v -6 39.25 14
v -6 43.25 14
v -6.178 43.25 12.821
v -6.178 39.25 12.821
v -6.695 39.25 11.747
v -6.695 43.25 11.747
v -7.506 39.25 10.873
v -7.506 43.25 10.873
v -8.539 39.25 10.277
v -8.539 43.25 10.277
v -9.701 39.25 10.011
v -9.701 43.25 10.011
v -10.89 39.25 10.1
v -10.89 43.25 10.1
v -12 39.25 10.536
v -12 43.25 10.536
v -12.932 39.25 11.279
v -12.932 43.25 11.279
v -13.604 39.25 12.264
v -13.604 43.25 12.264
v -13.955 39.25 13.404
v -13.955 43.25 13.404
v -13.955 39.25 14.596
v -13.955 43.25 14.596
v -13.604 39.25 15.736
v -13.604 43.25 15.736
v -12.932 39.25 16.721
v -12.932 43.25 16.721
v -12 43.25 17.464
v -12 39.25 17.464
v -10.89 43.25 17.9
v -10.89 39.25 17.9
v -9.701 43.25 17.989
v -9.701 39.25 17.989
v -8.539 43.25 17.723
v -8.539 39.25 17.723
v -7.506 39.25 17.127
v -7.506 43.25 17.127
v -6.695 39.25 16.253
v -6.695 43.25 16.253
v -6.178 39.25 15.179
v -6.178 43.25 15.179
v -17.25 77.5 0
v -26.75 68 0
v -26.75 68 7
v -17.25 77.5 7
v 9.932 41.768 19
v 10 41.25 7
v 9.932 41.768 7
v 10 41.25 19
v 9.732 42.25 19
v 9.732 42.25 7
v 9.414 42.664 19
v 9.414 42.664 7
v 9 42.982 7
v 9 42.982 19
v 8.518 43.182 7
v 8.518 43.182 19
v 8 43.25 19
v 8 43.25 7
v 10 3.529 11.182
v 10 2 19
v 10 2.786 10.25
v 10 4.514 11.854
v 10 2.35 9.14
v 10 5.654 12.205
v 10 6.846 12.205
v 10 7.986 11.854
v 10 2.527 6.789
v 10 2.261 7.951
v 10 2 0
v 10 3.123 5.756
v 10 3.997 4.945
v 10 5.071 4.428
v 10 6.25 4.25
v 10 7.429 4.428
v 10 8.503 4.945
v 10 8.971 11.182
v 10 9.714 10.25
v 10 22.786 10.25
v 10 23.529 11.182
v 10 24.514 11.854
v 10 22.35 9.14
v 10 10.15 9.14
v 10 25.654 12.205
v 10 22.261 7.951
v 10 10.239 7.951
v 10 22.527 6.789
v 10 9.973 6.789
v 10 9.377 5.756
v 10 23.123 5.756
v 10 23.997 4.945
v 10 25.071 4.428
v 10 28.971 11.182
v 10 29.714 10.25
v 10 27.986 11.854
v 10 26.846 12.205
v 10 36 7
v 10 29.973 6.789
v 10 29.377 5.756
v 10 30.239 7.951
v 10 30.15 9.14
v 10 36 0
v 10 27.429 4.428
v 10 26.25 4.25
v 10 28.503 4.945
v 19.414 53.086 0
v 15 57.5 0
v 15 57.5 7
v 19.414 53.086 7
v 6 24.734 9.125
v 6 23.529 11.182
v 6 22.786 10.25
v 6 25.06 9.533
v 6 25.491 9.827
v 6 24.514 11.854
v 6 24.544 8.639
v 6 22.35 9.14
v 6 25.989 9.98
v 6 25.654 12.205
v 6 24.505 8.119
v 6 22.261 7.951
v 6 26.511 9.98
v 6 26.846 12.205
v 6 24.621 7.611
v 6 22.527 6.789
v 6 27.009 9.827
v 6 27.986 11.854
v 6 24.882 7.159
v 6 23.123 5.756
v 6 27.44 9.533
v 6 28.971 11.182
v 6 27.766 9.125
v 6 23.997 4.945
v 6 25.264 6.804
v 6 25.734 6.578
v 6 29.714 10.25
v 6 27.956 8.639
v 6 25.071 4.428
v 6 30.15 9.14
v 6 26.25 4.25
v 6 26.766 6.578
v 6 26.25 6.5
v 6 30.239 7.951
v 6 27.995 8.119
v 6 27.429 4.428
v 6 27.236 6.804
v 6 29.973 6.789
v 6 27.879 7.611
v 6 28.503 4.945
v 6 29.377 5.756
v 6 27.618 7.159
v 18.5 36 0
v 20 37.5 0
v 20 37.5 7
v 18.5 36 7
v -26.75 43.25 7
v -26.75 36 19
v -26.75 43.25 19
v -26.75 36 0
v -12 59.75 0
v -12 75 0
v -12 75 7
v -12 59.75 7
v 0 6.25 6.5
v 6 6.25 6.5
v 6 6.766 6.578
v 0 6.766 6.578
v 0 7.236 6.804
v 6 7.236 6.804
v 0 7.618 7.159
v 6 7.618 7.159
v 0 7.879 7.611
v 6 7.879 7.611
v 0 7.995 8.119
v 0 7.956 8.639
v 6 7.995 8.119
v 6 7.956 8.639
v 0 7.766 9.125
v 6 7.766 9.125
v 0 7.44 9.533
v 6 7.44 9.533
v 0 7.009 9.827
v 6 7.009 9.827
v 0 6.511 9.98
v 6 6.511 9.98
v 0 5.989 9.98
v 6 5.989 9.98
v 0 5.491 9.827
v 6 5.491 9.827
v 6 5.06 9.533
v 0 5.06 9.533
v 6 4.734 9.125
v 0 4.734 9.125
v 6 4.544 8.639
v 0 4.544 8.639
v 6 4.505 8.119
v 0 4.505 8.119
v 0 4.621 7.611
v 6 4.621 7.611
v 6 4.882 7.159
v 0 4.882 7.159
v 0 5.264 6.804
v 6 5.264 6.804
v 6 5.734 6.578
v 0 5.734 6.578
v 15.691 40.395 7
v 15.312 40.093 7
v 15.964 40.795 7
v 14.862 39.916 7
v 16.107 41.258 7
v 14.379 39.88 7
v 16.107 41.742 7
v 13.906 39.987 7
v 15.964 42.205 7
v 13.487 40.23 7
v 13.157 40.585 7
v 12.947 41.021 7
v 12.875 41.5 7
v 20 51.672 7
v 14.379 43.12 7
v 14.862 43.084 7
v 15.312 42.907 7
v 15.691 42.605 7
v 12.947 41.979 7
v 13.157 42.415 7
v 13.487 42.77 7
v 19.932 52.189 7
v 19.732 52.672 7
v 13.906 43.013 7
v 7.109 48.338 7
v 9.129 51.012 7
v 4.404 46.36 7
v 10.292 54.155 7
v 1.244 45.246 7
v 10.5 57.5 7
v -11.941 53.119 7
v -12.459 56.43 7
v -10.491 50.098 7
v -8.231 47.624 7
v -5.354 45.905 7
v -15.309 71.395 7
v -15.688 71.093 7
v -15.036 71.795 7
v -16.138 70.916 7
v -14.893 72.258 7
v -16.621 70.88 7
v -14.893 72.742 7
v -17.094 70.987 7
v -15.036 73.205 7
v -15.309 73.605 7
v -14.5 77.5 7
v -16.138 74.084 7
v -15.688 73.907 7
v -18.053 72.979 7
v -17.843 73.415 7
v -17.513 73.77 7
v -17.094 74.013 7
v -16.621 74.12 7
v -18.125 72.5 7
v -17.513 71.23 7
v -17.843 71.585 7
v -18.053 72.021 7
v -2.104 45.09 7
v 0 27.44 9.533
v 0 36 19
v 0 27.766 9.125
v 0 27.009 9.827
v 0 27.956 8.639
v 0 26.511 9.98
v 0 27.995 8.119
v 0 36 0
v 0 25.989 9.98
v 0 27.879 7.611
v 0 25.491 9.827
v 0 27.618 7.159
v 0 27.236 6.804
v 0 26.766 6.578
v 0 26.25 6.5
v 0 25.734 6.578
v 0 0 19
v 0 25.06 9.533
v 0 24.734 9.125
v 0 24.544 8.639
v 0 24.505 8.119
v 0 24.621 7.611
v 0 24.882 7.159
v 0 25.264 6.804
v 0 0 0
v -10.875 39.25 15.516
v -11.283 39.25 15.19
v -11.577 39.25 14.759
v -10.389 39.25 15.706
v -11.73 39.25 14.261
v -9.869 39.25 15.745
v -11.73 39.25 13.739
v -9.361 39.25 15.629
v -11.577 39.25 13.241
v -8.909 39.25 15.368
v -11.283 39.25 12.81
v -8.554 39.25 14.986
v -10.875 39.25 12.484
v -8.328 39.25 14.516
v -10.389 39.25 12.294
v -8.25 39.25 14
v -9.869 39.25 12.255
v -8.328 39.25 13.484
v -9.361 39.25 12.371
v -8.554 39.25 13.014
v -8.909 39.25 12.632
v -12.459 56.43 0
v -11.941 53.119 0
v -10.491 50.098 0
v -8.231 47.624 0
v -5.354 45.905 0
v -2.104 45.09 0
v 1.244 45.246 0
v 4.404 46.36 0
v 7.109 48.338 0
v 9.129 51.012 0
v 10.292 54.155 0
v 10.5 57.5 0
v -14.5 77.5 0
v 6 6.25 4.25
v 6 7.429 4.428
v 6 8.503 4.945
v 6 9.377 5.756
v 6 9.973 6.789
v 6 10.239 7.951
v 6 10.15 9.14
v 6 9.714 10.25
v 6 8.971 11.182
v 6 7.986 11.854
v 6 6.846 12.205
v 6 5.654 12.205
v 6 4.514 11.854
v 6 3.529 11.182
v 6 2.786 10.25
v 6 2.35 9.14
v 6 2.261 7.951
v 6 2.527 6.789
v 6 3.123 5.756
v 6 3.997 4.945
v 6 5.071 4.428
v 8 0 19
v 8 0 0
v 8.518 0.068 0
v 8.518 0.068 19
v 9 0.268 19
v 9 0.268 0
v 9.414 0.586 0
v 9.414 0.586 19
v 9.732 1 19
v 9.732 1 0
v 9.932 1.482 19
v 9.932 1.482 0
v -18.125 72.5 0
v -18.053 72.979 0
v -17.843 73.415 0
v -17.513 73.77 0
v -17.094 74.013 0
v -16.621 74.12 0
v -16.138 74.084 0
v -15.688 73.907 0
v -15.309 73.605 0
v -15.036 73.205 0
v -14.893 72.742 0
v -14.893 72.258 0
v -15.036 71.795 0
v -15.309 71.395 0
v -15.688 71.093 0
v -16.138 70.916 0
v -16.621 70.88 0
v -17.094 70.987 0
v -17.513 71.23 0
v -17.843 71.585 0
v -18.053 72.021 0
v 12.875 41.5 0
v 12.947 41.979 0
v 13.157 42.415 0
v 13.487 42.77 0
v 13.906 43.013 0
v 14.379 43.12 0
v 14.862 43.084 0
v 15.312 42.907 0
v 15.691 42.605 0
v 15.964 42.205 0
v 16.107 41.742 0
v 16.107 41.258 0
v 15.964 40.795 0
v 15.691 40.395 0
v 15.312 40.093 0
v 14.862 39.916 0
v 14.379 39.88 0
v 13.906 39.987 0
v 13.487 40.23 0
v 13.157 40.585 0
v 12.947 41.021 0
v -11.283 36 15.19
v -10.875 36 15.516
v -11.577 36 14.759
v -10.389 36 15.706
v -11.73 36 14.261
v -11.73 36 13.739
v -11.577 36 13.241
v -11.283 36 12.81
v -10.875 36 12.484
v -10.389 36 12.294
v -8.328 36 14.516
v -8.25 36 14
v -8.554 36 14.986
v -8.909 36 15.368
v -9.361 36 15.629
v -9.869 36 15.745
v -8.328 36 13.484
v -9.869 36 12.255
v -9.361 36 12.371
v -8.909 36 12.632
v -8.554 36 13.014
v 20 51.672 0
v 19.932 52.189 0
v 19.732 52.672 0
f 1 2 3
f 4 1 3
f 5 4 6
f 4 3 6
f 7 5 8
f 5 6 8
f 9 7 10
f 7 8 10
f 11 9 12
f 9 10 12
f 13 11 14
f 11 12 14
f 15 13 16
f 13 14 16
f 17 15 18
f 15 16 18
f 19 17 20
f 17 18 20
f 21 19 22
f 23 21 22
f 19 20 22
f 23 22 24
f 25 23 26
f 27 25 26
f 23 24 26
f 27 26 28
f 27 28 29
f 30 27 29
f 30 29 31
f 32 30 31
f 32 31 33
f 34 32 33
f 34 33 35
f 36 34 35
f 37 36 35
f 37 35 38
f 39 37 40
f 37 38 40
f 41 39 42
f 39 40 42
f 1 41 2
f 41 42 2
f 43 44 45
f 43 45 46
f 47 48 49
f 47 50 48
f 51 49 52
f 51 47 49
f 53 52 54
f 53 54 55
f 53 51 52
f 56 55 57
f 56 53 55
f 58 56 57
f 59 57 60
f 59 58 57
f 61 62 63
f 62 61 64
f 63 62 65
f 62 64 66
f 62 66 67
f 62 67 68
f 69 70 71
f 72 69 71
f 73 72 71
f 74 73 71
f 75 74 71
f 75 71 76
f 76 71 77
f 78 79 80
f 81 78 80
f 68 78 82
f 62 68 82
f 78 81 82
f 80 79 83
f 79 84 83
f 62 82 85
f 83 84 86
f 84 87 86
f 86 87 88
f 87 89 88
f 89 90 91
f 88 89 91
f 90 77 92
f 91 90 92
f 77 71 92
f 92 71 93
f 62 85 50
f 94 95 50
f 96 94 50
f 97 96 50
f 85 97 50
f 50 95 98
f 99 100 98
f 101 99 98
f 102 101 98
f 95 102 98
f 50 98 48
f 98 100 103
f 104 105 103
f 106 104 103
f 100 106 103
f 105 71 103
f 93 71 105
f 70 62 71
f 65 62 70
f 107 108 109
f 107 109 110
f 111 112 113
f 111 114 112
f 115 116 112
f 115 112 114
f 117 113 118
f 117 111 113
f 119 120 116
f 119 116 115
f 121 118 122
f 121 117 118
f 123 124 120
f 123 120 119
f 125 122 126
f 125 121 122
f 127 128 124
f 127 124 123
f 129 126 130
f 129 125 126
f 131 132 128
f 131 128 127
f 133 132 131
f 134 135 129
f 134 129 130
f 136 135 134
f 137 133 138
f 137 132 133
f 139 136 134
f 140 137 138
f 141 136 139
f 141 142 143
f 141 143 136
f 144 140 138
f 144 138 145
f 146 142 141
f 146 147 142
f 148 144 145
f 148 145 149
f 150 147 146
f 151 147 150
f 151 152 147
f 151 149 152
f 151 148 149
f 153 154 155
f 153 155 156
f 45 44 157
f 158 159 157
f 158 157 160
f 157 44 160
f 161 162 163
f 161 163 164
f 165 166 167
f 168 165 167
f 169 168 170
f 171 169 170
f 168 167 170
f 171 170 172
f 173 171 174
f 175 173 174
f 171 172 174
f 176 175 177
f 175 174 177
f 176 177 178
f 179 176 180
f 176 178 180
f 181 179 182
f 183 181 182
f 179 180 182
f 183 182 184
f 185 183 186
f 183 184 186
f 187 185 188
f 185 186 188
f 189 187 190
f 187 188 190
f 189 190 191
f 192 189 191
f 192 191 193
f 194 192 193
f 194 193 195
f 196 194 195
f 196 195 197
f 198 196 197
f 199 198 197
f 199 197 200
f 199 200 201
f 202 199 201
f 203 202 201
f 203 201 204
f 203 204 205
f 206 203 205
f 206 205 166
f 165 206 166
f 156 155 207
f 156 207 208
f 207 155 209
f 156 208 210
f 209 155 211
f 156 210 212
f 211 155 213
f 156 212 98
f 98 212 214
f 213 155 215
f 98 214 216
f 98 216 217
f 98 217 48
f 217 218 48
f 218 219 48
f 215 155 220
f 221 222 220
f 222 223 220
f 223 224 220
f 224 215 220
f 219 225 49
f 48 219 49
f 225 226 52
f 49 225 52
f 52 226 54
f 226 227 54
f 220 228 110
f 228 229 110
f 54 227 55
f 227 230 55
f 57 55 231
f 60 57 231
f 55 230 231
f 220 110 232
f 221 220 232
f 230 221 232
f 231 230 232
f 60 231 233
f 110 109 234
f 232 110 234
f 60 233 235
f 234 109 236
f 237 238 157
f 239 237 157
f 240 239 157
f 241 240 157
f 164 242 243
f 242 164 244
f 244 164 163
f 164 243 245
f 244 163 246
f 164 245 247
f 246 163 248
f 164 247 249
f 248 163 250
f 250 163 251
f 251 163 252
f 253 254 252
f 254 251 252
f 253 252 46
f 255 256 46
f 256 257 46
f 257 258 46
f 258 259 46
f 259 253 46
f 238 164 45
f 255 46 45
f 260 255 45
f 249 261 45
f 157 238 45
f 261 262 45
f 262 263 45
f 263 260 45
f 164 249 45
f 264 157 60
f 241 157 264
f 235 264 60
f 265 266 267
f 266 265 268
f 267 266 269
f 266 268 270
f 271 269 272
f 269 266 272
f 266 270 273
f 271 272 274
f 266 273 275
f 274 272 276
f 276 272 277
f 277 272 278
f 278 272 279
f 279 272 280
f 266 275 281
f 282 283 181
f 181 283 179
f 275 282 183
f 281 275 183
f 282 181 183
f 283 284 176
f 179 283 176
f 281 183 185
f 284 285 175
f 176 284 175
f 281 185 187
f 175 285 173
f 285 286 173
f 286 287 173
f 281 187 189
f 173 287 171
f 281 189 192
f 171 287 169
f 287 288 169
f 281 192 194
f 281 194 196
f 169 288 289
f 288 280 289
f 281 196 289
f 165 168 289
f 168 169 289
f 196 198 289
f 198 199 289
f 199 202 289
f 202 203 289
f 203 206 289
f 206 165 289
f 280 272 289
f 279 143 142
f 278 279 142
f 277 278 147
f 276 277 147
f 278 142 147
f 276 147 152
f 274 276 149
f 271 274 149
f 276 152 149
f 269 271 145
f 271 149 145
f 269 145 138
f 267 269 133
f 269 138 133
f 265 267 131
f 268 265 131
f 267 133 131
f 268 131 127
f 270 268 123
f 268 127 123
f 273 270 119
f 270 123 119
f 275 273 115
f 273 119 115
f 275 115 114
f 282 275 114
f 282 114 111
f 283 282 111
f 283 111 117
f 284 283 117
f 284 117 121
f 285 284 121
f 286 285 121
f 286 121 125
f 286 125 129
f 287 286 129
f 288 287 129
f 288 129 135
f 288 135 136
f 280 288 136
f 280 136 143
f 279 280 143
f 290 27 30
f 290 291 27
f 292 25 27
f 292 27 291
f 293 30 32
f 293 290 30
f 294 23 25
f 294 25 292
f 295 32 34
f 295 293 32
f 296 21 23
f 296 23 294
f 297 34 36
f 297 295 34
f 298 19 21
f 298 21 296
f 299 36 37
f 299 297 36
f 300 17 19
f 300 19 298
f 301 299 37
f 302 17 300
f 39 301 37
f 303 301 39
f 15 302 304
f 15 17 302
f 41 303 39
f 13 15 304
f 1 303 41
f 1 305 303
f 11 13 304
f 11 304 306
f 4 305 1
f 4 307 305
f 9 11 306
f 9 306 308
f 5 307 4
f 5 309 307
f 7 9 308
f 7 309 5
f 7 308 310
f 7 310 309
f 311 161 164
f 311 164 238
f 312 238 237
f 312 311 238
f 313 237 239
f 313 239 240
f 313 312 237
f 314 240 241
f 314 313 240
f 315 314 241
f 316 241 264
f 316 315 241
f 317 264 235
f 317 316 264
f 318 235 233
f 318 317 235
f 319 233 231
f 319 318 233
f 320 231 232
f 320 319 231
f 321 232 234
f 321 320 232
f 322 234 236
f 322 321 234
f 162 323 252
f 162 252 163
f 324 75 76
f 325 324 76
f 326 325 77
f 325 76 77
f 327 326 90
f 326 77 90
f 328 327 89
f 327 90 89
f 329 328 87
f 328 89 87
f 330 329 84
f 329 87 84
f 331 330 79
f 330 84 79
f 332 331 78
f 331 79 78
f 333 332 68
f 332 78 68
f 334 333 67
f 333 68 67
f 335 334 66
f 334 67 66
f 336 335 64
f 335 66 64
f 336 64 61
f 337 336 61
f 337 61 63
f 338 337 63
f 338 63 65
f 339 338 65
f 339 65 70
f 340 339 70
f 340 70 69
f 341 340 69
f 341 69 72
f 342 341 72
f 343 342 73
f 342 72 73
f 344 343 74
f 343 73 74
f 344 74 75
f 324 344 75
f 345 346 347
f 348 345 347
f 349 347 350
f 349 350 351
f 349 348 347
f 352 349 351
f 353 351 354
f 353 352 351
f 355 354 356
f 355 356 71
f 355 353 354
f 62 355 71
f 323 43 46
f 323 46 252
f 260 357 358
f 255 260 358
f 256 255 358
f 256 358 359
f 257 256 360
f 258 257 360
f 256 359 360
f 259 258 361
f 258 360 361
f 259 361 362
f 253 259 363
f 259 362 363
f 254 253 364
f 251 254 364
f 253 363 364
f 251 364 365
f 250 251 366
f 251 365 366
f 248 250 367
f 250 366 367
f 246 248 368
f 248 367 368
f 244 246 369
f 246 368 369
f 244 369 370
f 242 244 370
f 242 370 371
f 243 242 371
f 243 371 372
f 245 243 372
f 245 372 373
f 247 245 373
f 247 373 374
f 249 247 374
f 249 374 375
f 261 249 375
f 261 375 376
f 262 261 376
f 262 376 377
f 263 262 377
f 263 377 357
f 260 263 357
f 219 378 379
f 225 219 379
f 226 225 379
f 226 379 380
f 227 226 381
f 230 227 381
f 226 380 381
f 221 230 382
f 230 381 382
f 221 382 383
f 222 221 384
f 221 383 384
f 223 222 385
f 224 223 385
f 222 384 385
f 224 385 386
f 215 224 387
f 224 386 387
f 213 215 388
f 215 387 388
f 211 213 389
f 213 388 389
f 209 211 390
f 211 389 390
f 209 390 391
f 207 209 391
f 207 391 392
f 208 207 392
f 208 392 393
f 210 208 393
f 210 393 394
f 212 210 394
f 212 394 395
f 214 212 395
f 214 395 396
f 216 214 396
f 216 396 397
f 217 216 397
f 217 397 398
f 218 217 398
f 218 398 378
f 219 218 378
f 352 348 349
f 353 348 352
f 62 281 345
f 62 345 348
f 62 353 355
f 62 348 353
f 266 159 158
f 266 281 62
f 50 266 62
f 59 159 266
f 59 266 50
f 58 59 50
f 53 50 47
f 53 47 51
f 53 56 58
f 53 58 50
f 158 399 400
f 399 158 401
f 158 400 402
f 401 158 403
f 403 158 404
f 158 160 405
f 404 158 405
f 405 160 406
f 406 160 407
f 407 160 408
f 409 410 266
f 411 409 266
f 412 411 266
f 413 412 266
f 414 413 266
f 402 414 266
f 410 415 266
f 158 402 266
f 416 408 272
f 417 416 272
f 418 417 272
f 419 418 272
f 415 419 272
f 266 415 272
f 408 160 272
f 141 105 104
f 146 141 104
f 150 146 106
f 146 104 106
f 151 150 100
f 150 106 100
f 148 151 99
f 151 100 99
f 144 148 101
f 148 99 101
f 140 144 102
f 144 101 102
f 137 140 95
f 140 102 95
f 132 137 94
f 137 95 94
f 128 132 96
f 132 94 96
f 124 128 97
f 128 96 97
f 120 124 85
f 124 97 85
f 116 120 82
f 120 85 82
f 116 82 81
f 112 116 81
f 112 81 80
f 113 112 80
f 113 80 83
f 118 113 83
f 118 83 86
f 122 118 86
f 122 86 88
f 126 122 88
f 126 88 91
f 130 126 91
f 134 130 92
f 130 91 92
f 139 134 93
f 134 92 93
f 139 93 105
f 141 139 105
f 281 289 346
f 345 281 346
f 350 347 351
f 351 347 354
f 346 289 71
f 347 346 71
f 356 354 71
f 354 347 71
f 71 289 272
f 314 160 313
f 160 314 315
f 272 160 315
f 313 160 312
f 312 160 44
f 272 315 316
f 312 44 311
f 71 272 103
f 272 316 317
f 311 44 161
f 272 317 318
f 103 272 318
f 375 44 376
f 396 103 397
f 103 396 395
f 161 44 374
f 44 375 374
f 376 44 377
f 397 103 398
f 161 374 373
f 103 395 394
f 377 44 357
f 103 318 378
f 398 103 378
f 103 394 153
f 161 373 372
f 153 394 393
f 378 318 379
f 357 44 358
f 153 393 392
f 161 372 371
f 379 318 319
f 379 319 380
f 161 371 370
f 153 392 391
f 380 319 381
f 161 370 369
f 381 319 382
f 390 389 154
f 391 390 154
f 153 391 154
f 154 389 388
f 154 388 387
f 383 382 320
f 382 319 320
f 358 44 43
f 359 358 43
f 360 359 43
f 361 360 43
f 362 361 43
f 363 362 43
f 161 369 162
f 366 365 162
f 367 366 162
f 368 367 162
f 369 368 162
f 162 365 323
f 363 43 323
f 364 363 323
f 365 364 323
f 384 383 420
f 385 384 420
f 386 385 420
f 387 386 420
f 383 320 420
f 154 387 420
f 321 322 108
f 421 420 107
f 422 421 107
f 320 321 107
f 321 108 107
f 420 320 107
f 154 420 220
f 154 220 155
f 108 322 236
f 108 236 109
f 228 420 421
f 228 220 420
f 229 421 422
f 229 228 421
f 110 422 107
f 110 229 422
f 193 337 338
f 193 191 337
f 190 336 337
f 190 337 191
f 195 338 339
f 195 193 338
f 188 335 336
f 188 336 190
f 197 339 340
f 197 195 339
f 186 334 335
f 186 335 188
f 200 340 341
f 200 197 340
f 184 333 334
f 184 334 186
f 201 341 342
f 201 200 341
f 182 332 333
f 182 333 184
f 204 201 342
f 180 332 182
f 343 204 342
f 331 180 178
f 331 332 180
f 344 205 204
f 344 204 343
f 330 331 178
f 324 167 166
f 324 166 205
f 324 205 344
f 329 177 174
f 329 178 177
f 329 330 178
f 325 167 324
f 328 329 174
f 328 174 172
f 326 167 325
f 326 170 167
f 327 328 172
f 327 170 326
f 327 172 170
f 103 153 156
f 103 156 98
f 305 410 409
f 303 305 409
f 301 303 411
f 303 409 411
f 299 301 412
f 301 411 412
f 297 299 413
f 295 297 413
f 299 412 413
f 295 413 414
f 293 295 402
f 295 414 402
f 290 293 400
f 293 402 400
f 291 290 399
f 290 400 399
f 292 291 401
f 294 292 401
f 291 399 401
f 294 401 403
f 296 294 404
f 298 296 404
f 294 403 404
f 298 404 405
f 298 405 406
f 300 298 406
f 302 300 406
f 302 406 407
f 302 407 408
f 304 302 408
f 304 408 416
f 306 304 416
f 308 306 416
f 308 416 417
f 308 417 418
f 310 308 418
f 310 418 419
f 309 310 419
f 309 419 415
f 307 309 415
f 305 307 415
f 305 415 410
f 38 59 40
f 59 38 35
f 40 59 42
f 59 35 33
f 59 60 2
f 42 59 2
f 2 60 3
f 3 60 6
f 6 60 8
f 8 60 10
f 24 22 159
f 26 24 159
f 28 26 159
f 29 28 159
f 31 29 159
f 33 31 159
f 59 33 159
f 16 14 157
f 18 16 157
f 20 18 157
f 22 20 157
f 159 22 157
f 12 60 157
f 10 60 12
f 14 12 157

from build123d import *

# Parameters (mm, degrees)
BOSS_EXTRUDE1_DEPTH = 19
BOSS_EXTRUDE2_DEPTH = 7
SKETCH3_R           = 1.75
CUT_EXTRUDE1_DEPTH  = 37.75
SKETCH6_R           = 4
CUT_EXTRUDE4_DEPTH  = 4
SKETCH7_R           = 1.625
CUT_EXTRUDE5_DEPTH  = 20
FILLET1_R           = 2
SKETCH8_R           = 1.75
CUT_EXTRUDE6_DEPTH  = 10
SKETCH9_R           = 4
CUT_EXTRUDE7_DEPTH  = 4


with BuildPart() as part:
    # Sketch1 → Boss-Extrude1 (new body)
    with BuildSketch(Plane.XY):
        Polygon((0, 0), (10, 0), (10, 43.25), (-26.75, 43.25), (-26.75, 36), (0, 36), align=None)
    extrude(amount=BOSS_EXTRUDE1_DEPTH)

    # Sketch2 → Boss-Extrude2 (add)
    with BuildSketch(Plane(origin=(0, 0, 0), x_dir=(-1, 0, 0), z_dir=(0, 0, -1))):
        with BuildLine():
            Line((-10, 36), (26.75, 36))
            Line((26.75, 36), (26.75, 68))
            Line((26.75, 68), (17.25, 77.5))
            Line((17.25, 77.5), (14.5, 77.5))
            Line((14.5, 77.5), (12, 75))
            Line((12, 75), (12, 59.75))
            ThreePointArc((12, 59.75), (2.103531724, 45.089682755), (-10.5, 57.5))
            Line((-10.5, 57.5), (-15, 57.5))
            Line((-15, 57.5), (-20, 52.5))
            Line((-20, 52.5), (-20, 37.5))
            Line((-20, 37.5), (-18.5, 36))
            Line((-18.5, 36), (-10, 36))
        make_face()
    extrude(amount=-BOSS_EXTRUDE2_DEPTH)

    # Sketch3 → Cut-Extrude1 (cut, through all)
    with BuildSketch(Plane(origin=(10, 0, 0), x_dir=(0, 0, -1), z_dir=(1, 0, 0))):
        with Locations((-8.25, 26.25)):
            Circle(SKETCH3_R)
        with Locations((-8.25, 6.25)):
            Circle(SKETCH3_R)
    extrude(amount=-CUT_EXTRUDE1_DEPTH, mode=Mode.SUBTRACT)

    # Sketch6 → Cut-Extrude4 (cut)
    with BuildSketch(Plane(origin=(10, 0, 0), x_dir=(0, 0, -1), z_dir=(1, 0, 0))):
        with Locations((-8.25, 26.25)):
            Circle(SKETCH6_R)
        with Locations((-8.25, 6.25)):
            Circle(SKETCH6_R)
    extrude(amount=-CUT_EXTRUDE4_DEPTH, mode=Mode.SUBTRACT)

    # Sketch7 → Cut-Extrude5 (cut, through all)
    with BuildSketch(Plane(origin=(0, 0, 0), x_dir=(-1, 0, 0), z_dir=(0, 0, -1))):
        with Locations((16.5, 72.5)):
            Circle(SKETCH7_R)
        with Locations((-14.5, 41.5)):
            Circle(SKETCH7_R)
    extrude(amount=-CUT_EXTRUDE5_DEPTH, mode=Mode.SUBTRACT)

    # Fillet1
    fillet1_edges = [part.edges().sort_by_distance(p)[0] for p in [
        (10, 43.25, 13),
        (10, 0, 9.5),
        (20, 52.5, 3.5),
    ]]
    fillet(fillet1_edges, radius=FILLET1_R)

    # Sketch8 → Cut-Extrude6 (cut)
    with BuildSketch(Plane.XZ.offset(-36)):
        with Locations((-10, 14)):
            Circle(SKETCH8_R)
    extrude(amount=-CUT_EXTRUDE6_DEPTH, mode=Mode.SUBTRACT)

    # Sketch9 → Cut-Extrude7 (cut)
    with BuildSketch(Plane(origin=(0, 43.25, 0), x_dir=(1, 0, 0), z_dir=(0, 1, 0))):
        with Locations((-10, -14)):
            Circle(SKETCH9_R)
    extrude(amount=-CUT_EXTRUDE7_DEPTH, mode=Mode.SUBTRACT)


solid = part.part
